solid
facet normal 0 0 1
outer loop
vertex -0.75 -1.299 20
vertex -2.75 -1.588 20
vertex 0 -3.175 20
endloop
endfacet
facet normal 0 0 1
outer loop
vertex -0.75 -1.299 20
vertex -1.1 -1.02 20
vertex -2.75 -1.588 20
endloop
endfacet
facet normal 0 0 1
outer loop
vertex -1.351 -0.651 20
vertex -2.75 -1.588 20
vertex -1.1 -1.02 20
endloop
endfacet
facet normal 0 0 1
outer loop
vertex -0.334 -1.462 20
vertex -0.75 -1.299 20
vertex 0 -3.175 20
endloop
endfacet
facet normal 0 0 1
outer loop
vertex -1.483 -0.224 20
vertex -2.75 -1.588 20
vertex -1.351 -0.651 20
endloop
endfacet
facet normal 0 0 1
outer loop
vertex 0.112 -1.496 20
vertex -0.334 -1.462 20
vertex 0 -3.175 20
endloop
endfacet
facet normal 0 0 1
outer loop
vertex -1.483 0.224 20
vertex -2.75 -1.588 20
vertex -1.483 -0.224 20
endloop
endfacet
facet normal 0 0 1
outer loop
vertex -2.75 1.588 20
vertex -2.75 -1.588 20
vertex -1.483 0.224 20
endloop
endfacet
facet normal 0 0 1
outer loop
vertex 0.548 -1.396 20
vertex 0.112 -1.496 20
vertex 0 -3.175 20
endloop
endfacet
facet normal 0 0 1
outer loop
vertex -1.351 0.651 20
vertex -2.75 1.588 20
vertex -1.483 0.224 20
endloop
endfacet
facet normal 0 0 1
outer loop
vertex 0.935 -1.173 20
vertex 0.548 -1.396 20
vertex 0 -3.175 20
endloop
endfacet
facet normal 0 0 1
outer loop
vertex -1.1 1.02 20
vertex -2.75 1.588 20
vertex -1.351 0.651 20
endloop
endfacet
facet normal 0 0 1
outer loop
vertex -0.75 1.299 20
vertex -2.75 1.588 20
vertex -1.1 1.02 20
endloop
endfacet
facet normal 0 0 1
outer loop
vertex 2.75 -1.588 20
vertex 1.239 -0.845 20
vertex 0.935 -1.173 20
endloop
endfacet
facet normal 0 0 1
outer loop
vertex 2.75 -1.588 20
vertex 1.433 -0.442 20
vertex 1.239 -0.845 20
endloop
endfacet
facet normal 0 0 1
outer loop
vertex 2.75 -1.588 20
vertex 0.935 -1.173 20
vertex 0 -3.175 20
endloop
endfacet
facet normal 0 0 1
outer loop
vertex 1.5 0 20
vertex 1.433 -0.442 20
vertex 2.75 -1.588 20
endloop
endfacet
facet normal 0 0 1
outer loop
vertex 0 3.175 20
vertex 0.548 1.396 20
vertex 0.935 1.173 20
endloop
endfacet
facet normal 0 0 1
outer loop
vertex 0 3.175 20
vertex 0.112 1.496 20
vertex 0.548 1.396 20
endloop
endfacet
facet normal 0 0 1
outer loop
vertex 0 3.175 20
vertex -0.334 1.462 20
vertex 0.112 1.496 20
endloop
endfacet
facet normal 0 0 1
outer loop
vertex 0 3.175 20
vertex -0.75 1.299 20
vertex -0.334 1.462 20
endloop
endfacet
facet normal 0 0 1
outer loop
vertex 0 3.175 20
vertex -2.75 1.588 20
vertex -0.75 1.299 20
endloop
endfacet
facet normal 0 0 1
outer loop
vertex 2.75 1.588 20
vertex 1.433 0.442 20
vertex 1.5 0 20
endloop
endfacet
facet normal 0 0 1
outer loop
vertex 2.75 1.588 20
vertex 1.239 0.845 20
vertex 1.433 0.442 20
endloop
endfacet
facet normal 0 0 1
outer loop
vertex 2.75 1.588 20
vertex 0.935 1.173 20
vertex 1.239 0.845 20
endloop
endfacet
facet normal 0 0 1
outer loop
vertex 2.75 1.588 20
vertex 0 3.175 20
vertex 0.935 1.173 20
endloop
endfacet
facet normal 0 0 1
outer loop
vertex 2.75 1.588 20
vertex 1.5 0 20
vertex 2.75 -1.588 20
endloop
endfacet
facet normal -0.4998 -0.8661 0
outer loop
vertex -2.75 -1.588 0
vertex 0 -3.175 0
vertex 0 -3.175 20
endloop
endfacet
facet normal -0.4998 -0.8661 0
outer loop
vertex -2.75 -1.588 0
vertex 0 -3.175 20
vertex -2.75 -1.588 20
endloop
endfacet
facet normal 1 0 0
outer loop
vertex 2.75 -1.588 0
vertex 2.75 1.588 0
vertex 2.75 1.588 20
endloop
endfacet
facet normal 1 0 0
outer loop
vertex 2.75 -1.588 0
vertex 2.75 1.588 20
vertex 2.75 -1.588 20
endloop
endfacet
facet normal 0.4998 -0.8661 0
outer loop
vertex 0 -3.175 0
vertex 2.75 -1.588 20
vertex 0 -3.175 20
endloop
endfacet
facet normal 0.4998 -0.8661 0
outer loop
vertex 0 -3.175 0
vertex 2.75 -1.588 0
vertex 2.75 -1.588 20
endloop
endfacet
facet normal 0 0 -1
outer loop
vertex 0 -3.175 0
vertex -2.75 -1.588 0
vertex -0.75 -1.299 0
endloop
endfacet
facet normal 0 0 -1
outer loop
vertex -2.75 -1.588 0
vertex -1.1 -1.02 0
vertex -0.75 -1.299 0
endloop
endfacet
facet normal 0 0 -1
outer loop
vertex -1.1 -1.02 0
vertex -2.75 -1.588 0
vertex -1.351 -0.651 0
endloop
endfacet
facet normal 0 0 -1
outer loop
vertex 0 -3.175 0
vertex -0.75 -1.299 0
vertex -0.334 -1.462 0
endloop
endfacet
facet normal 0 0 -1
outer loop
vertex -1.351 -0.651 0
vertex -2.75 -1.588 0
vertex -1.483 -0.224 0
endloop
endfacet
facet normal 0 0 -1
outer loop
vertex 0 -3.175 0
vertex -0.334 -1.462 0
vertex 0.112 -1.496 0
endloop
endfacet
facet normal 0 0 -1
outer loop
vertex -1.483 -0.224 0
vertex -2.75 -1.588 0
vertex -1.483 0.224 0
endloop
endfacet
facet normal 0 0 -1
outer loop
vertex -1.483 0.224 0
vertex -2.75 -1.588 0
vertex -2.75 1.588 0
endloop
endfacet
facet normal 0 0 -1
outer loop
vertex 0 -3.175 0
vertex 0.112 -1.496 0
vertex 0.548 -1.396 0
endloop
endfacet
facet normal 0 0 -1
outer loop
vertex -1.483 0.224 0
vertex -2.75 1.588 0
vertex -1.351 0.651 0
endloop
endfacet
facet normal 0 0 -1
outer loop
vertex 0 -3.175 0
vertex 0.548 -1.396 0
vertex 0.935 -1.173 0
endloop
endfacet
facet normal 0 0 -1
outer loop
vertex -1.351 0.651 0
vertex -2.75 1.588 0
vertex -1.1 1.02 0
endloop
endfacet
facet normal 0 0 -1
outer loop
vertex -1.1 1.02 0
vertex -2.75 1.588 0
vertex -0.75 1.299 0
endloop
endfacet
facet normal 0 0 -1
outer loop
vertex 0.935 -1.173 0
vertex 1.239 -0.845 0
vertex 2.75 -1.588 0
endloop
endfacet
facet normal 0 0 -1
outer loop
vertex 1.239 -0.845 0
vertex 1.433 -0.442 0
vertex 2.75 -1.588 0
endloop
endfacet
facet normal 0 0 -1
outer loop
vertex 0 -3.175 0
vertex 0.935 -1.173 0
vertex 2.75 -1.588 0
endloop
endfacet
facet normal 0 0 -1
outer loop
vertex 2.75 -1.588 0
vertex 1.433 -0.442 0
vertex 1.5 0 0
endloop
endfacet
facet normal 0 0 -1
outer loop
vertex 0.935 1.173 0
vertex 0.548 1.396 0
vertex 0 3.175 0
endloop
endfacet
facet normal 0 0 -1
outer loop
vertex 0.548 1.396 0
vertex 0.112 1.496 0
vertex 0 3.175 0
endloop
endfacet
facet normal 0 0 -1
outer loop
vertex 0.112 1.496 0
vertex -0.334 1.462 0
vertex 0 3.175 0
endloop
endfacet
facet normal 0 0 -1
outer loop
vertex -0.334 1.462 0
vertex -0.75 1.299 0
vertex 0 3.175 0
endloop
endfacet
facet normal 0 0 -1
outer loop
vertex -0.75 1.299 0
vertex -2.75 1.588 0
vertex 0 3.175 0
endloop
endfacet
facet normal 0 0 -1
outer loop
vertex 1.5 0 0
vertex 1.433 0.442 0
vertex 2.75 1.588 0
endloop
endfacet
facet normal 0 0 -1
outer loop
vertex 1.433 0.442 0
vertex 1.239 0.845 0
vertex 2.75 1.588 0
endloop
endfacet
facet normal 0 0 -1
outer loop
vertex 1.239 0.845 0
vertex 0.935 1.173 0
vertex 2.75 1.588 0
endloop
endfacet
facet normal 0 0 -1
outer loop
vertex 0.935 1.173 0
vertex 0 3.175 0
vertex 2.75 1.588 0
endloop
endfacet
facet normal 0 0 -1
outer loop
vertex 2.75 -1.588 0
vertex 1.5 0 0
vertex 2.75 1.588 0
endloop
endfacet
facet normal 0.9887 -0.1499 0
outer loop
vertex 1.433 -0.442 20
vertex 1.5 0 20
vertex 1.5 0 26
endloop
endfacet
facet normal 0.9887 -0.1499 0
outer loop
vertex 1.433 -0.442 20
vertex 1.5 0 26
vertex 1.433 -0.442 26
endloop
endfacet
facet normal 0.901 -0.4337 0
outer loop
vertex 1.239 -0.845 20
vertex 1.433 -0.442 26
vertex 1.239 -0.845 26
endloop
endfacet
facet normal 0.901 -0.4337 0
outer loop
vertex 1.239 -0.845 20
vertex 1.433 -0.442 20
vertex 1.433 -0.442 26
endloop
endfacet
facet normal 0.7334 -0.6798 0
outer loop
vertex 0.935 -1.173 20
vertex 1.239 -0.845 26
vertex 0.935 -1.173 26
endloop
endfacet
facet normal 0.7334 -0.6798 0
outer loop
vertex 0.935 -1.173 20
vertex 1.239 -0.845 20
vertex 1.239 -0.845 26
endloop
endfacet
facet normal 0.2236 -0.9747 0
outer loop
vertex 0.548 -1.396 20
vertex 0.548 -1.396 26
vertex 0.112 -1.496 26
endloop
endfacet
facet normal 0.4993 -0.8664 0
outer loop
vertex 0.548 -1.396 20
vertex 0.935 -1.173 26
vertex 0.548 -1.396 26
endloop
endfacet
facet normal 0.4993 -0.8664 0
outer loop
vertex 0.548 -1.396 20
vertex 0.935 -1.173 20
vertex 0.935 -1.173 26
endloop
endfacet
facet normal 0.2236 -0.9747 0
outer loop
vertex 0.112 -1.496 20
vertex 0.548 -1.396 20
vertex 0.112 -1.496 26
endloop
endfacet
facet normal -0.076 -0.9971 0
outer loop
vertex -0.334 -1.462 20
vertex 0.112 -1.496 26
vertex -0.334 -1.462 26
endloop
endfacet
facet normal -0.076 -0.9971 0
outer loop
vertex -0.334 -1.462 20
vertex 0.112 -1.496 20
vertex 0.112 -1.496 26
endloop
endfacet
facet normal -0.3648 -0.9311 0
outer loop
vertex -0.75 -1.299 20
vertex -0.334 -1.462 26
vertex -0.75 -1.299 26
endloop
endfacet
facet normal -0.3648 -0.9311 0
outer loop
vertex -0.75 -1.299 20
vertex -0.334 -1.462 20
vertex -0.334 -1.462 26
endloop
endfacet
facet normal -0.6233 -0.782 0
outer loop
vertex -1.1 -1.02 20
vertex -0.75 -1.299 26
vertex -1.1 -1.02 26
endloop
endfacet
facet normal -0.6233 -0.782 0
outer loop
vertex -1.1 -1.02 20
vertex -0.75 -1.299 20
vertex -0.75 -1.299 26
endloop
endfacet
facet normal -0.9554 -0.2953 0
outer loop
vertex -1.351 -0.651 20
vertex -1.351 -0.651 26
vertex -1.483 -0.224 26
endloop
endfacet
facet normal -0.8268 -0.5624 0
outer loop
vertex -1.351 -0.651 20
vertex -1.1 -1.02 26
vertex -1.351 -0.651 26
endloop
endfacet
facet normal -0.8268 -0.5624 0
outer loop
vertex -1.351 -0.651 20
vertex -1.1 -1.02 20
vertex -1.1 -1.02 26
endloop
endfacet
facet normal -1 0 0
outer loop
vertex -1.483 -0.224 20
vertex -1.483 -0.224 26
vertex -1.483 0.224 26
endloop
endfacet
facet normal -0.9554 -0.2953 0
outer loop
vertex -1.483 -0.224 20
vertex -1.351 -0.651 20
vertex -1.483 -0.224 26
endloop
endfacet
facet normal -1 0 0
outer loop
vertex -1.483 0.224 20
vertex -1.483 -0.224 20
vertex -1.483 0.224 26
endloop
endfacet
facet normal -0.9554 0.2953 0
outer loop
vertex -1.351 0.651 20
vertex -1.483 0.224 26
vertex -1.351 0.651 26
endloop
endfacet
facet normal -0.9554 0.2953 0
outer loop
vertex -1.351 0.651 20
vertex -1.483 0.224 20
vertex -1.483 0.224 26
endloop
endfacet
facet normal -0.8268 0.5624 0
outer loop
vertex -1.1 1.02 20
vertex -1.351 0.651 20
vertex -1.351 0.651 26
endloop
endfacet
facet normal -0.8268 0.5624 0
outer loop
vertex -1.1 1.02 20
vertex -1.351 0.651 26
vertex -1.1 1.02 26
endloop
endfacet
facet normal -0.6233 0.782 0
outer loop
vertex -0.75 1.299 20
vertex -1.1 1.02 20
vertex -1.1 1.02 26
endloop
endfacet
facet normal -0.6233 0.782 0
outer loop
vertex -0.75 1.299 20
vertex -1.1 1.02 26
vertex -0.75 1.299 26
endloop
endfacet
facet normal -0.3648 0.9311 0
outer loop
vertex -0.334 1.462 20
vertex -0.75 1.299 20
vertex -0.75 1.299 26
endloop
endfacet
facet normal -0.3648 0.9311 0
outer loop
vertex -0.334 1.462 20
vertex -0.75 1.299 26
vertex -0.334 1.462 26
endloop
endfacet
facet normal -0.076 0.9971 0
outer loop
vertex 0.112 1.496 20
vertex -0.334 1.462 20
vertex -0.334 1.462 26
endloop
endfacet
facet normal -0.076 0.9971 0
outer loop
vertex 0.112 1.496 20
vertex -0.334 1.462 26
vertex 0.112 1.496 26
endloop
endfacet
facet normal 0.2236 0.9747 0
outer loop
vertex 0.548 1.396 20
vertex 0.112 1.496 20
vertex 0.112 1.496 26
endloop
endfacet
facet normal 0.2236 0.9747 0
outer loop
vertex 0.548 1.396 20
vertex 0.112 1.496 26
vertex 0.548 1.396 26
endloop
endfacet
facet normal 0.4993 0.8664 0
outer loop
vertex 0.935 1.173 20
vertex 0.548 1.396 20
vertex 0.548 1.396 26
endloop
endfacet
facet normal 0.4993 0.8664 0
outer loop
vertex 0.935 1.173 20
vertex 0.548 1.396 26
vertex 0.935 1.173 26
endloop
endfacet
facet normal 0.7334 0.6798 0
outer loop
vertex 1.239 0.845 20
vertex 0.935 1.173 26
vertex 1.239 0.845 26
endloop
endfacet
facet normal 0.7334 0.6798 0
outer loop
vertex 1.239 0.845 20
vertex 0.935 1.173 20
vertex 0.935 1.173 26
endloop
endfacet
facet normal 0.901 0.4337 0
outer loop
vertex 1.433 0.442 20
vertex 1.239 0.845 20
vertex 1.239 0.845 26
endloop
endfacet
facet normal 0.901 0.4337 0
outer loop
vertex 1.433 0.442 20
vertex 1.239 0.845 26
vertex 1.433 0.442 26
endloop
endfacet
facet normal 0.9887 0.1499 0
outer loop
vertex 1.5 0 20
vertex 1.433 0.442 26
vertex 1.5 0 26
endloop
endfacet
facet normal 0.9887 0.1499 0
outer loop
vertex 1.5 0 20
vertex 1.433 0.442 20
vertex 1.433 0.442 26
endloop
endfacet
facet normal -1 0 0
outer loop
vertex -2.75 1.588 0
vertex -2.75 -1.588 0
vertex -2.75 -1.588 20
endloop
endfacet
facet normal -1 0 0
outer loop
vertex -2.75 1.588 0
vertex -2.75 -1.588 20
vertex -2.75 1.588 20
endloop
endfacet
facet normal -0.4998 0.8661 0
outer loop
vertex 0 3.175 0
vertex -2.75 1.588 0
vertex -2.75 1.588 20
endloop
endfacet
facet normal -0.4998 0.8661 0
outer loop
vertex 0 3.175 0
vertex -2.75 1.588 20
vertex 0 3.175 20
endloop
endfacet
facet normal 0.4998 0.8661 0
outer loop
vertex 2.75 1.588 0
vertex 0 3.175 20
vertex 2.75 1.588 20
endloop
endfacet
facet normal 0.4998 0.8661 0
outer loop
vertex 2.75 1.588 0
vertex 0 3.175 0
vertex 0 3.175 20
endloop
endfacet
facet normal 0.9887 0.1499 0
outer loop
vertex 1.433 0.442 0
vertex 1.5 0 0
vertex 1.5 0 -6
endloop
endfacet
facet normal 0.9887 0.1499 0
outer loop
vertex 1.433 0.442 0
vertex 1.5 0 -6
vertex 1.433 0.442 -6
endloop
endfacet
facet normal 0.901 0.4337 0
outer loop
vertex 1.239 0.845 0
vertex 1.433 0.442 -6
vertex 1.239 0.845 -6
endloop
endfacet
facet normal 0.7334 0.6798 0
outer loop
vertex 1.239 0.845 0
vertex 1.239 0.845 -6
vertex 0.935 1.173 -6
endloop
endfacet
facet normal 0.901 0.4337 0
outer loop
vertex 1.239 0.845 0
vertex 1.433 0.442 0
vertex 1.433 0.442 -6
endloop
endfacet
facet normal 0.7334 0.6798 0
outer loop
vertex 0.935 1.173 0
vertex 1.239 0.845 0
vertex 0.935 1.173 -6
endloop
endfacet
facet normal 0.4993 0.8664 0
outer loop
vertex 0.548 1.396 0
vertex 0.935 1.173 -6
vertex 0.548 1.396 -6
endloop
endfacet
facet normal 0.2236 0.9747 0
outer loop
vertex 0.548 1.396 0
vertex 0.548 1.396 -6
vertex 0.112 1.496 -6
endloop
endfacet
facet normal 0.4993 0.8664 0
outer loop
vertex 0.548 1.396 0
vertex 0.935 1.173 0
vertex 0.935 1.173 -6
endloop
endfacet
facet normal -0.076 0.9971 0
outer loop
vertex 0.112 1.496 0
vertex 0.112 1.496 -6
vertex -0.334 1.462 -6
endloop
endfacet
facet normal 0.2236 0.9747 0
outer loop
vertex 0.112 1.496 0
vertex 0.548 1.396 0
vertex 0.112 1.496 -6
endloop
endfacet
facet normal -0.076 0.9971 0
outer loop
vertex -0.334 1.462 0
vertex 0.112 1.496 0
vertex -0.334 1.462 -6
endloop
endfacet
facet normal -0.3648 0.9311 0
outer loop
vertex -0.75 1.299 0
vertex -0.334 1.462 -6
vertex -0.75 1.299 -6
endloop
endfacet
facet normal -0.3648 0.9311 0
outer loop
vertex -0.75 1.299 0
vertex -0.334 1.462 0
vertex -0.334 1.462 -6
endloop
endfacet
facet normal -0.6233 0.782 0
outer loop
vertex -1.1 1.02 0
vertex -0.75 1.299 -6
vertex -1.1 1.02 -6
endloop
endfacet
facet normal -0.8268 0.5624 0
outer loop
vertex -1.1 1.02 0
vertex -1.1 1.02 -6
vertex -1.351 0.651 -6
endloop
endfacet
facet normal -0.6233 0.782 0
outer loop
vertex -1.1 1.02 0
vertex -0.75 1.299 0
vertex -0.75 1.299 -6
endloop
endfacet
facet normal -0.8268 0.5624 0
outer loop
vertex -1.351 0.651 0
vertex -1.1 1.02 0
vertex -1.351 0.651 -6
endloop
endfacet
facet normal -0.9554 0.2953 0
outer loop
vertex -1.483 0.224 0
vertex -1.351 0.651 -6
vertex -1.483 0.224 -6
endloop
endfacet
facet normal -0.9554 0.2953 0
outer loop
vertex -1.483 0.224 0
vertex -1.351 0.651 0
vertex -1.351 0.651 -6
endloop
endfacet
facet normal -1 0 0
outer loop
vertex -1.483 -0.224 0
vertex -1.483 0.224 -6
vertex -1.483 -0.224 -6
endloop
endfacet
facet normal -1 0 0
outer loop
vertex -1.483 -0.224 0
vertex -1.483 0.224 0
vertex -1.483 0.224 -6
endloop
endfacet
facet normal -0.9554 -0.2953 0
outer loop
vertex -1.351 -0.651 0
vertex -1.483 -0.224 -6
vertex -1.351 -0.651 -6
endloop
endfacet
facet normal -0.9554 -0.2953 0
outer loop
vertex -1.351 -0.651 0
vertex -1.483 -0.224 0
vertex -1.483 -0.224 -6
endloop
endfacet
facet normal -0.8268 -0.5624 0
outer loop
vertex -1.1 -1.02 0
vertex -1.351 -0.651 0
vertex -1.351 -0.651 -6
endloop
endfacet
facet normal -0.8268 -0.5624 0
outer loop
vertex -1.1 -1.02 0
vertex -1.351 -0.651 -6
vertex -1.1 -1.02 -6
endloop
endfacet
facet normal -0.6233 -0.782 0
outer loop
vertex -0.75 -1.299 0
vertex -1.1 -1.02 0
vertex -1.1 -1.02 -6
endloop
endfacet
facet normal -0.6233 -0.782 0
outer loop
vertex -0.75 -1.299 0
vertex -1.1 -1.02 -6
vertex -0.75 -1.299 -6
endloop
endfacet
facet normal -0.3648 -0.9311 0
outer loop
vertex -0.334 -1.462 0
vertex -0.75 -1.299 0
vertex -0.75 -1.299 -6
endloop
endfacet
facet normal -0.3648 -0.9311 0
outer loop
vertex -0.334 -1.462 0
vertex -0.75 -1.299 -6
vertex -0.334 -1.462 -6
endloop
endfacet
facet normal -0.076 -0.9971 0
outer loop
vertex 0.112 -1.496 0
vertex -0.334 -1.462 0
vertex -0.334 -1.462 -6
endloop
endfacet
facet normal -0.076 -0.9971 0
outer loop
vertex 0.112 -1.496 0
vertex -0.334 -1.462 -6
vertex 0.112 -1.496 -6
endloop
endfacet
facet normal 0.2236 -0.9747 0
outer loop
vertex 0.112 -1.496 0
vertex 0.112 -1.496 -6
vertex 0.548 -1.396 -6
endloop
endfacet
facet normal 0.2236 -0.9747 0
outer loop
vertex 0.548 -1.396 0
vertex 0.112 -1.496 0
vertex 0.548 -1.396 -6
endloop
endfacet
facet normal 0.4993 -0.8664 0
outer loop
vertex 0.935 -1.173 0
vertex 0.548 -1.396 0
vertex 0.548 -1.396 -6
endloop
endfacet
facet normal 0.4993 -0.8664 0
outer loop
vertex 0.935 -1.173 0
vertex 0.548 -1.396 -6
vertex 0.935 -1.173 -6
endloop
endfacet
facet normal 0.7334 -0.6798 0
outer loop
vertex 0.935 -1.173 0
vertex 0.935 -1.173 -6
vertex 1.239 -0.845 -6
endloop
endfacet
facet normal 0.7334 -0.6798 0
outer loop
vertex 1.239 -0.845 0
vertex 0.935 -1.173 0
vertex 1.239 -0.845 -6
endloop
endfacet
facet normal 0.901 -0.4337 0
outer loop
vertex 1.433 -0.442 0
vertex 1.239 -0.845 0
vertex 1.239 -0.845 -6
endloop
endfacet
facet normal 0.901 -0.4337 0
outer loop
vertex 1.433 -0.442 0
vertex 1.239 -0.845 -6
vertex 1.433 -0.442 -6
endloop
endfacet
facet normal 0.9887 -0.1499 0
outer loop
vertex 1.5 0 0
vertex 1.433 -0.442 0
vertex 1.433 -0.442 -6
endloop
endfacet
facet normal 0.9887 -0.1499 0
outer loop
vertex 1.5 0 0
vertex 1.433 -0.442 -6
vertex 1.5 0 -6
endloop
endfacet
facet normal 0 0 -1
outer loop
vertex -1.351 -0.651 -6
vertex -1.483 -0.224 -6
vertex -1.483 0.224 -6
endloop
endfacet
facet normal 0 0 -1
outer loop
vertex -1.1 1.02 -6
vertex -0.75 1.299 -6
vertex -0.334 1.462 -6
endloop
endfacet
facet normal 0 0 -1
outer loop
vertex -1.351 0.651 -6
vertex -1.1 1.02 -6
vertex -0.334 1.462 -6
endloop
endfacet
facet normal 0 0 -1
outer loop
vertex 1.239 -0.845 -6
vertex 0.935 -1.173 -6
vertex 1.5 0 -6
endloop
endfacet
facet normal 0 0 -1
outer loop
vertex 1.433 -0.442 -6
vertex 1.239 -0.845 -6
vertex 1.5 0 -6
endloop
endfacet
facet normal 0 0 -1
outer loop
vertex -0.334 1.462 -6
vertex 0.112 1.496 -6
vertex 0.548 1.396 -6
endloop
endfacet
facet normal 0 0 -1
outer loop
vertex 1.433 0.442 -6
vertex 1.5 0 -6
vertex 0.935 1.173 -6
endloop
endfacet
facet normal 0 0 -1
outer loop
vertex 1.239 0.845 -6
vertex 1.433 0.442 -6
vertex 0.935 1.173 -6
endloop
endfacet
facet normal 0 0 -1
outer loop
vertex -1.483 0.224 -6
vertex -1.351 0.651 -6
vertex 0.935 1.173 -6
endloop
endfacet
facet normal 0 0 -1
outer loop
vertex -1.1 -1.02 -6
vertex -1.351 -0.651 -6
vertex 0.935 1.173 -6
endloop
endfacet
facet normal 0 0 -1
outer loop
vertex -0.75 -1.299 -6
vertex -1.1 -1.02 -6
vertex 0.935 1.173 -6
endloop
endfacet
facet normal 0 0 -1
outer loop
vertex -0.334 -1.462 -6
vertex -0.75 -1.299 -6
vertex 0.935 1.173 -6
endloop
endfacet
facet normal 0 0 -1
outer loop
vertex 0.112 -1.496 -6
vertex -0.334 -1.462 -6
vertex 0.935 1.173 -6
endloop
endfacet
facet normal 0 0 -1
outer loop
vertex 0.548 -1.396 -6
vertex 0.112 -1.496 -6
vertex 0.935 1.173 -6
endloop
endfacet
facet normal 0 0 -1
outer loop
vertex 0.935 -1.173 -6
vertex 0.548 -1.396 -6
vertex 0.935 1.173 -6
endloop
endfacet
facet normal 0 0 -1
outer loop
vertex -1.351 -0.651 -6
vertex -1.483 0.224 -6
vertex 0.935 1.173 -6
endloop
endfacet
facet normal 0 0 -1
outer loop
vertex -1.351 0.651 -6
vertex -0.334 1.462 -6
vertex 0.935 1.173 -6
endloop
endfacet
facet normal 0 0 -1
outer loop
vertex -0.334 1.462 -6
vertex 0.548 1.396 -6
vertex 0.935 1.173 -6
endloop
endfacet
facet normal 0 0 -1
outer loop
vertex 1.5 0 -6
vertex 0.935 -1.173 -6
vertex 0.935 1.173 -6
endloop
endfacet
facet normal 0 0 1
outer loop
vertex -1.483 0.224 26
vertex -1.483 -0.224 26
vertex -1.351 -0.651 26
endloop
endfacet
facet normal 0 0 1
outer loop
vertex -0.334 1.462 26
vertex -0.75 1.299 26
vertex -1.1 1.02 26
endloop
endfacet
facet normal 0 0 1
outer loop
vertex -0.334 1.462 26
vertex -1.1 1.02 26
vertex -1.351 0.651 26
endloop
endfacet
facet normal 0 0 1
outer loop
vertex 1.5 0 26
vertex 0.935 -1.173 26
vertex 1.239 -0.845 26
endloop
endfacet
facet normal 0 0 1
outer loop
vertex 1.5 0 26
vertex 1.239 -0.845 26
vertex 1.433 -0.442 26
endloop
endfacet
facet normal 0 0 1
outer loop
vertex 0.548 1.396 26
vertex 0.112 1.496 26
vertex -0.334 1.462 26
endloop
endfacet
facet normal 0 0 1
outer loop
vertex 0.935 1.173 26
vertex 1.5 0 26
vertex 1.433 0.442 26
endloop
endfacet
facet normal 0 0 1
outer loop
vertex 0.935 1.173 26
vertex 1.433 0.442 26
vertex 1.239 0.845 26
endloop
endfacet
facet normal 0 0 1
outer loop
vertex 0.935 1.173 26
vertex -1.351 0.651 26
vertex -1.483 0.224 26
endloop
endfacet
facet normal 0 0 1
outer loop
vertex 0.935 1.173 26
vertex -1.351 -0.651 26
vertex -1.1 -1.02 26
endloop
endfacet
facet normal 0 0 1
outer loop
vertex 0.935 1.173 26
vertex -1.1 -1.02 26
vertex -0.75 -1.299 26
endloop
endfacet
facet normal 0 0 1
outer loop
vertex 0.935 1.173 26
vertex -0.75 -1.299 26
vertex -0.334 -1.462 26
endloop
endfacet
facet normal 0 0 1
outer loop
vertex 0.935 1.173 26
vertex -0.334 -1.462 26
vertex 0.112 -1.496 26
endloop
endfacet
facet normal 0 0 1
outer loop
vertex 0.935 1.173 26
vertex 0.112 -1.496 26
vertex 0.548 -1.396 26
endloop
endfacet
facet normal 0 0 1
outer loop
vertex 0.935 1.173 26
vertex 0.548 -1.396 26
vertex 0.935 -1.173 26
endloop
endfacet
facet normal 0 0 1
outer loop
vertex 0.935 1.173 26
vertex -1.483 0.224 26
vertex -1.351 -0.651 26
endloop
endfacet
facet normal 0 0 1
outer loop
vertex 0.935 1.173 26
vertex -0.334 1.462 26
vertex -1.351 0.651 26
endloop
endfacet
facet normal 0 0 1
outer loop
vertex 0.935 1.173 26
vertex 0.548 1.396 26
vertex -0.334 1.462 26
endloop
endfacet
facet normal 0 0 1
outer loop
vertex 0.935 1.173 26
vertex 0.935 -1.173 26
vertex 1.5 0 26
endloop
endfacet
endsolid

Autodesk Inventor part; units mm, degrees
ref_plane "YZ Plane" through (0, 0, 0) normal (1, 0, 0) x (0, 1, 0)
ref_plane "XZ Plane" through (0, 0, 0) normal (0, 1, 0) x (-1, 0, 0)
ref_plane "XY Plane" through (0, 0, 0) normal (0, 0, 1) x (1, 0, 0)
sketch "スケッチ1" plane through (0, 0, 0) normal (0, 0, 1) x (1, 0, 0)
  line L0 (-2.75, 1.5877) -> (0, 3.1754)
  line L1 (0, 3.1754) -> (2.75, 1.5877)
  line L2 (2.75, 1.5877) -> (2.75, -1.5877)
  line L3 (2.75, -1.5877) -> (0, -3.1754)
  line L4 (0, -3.1754) -> (-2.75, -1.5877)
  line L5 (-2.75, -1.5877) -> (-2.75, 1.5877)
  circle A0 centre (0, 0) radius 1.5
  dimension "d0" = 5.5
  dimension "d1" = 3
extrude "押し出し1" add sketch "スケッチ1" along normal blind 20 contours L0 L1 L2 L3 L4 L5 | A0
sketch "スケッチ2" plane through (0, 0, 20) normal (0, 0, 1) x (1, 0, 0)
  circle A0 centre (0, 0) radius 1.5
  dimension "d4" = 3
extrude "押し出し2" add sketch "スケッチ2" along normal blind 6
extrude "押し出し3" add sketch "スケッチ1" against normal blind 6 contours A0
properties part number "スペーサー　両雄ねじ　m3-20" material "アルミニウム 2014-T4"
